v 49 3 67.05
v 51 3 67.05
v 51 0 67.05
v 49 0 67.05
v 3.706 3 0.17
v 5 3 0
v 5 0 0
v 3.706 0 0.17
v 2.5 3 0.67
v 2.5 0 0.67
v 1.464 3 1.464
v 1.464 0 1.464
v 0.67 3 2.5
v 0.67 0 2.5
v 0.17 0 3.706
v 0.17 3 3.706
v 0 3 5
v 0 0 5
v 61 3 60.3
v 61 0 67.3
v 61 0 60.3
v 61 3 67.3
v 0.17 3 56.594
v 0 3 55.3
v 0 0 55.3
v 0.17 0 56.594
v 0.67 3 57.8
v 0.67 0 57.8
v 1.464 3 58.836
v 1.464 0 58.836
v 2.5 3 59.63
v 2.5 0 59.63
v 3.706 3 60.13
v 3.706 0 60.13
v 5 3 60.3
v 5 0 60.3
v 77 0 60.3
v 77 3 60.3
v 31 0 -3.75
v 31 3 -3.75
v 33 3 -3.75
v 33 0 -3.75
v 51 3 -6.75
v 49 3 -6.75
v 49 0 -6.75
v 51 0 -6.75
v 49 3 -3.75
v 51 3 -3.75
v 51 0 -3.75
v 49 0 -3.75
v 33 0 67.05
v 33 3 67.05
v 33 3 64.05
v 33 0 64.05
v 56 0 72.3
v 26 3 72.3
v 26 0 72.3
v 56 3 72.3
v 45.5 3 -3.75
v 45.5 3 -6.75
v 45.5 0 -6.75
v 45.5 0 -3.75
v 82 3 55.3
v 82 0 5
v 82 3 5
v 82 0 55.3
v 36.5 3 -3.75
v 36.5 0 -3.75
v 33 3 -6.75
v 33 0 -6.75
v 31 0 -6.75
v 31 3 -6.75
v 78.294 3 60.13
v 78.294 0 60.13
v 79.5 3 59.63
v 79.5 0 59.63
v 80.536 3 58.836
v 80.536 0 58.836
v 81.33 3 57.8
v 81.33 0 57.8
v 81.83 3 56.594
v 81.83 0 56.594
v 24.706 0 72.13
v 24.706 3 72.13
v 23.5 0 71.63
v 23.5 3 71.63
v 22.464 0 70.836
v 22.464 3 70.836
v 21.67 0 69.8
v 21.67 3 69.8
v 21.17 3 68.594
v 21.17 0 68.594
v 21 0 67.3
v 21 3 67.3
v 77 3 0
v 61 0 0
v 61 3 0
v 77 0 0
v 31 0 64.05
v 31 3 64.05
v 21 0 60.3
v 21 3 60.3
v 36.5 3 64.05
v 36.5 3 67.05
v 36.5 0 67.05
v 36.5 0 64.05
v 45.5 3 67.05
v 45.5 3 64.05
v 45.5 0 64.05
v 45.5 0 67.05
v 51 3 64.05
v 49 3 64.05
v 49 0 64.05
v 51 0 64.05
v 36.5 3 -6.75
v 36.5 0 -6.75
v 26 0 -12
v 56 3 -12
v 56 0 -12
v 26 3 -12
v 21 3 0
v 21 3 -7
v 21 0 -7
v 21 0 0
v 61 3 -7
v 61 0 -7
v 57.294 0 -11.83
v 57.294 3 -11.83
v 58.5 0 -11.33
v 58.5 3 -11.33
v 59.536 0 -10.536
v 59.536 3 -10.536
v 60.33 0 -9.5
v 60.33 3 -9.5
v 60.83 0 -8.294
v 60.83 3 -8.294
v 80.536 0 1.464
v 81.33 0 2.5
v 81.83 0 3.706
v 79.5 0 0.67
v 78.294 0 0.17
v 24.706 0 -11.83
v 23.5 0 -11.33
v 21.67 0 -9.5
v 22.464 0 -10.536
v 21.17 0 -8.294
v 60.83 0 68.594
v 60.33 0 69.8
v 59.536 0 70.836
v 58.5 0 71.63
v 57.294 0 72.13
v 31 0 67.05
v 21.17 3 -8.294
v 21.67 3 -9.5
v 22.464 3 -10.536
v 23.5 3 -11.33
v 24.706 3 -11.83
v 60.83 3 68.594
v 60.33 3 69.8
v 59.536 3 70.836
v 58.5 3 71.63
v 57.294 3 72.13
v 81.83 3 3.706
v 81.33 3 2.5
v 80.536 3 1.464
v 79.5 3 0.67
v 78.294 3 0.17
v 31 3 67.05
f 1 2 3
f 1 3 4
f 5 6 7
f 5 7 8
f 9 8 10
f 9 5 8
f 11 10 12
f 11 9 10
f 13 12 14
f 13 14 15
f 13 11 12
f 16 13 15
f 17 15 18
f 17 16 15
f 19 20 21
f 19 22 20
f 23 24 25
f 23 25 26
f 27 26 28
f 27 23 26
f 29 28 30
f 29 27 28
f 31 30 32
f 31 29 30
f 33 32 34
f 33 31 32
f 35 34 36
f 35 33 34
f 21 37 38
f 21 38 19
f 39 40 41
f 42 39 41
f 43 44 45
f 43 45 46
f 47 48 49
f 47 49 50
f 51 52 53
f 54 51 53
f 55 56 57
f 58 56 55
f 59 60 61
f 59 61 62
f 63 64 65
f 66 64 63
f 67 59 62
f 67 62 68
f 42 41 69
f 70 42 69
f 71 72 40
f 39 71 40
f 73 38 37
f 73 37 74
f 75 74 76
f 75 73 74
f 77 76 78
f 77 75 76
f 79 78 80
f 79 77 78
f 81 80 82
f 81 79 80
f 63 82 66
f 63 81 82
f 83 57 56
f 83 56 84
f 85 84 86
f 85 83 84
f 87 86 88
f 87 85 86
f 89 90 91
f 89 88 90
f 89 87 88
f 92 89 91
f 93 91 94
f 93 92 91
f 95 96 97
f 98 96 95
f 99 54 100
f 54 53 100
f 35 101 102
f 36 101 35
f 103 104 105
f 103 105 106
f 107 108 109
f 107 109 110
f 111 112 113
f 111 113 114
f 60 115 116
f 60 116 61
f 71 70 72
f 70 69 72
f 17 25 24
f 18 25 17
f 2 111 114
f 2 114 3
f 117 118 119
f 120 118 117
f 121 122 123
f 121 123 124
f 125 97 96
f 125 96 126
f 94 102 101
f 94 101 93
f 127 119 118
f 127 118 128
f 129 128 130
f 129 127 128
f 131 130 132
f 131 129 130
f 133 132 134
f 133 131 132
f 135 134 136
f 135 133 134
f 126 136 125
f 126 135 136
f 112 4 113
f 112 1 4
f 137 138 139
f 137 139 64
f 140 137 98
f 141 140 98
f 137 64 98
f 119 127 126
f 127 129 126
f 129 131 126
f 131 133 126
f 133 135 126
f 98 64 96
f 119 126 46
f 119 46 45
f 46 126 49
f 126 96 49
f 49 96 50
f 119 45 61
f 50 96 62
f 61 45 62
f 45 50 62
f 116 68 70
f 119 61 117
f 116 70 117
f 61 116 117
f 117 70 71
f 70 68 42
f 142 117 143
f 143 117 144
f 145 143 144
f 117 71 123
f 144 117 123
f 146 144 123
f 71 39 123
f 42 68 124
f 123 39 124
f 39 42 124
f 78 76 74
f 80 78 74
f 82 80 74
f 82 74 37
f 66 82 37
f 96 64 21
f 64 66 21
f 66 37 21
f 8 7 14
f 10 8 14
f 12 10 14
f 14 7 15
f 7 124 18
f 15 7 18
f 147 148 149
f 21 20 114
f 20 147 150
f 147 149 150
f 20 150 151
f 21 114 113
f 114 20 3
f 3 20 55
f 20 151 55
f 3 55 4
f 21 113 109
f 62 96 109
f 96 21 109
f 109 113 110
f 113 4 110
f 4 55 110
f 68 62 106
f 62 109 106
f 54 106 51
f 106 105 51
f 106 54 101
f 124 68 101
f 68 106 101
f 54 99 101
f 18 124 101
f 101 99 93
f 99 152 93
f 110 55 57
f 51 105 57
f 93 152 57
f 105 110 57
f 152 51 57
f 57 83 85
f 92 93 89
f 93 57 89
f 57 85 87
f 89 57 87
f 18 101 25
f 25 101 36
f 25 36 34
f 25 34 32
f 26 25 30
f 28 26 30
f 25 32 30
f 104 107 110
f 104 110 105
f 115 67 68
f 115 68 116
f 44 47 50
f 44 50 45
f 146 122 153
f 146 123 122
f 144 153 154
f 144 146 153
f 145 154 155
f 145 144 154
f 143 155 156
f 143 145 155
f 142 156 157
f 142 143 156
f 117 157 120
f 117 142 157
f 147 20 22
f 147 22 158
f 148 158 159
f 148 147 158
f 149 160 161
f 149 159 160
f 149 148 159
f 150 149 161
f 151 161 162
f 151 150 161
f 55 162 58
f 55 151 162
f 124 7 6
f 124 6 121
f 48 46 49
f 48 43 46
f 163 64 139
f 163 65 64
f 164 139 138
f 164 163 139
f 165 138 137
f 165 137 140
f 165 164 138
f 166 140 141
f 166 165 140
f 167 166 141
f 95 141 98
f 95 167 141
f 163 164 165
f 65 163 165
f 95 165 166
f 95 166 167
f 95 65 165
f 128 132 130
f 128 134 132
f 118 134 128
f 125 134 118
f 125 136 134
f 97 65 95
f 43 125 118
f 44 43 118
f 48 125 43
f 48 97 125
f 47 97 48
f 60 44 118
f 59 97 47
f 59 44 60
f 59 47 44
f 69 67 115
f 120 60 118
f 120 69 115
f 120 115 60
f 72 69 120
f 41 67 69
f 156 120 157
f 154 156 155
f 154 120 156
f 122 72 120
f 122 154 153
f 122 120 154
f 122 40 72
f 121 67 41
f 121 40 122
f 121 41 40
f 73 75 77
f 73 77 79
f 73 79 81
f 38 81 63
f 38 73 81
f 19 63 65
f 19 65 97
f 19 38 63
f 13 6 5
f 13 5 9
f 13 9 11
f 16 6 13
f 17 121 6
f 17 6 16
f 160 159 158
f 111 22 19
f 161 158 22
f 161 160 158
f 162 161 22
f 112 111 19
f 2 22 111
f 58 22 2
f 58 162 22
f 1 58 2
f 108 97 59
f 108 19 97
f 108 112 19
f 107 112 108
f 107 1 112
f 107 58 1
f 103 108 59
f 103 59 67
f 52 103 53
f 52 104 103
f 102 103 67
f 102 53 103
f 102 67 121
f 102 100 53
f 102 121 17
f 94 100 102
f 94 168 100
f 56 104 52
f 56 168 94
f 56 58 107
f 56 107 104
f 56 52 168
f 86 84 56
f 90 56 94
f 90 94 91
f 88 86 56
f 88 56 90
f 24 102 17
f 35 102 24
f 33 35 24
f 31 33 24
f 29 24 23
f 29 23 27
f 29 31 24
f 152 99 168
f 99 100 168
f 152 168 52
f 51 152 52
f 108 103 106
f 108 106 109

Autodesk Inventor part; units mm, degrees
ref_plane "YZ Plane" through (0, 0, 0) normal (1, 0, 0) x (0, 1, 0)
ref_plane "XZ Plane" through (0, 0, 0) normal (0, 1, 0) x (-1, 0, 0)
sketch "Sketch1" plane through (0, 0, 0) normal (0, 1, 0) x (-1, 0, 0)
  line L0 (0, 0) -> (-82, 0)
  line L1 (-82, 0) -> (-82, 60.3)
  line L2 (-82, 60.3) -> (0, 60.3)
  line L3 (0, 60.3) -> (0, 0)
  dimension "d0" = 82
  dimension "d1" = 60.3
extrude "Extrusion1" add sketch "Sketch1" along normal blind 3
sketch "Sketch3" plane through (0, 3, 0) normal (0, 1, 0) x (1, 0, 0)
  line L0 (82, -60.3) -> (82, 0) projected
  line L1 (82, 0) -> (0, 0) projected
  line L2 (21, 0) -> (61, 0)
  line L3 (61, 0) -> (61, 12)
  line L4 (61, 12) -> (21, 12)
  line L5 (21, 12) -> (21, 0)
  dimension "d22" = 82
  dimension "d23" = 12
  dimension "d24" = 21
  dimension "d25" = 40
extrude "Extrusion3" add sketch "Sketch3" against normal blind 3
sketch "Sketch4" plane through (0, 3, 0) normal (0, 1, 0) x (1, 0, 0)
  line L0 (82, 0) -> (61, 0) projected
  line L1 (61, 0) -> (61, 12) projected
  line L2 (36.5, 6.75) -> (45.5, 6.75)
  line L3 (45.5, 6.75) -> (45.5, 3.75)
  line L4 (45.5, 3.75) -> (36.5, 3.75)
  line L5 (36.5, 3.75) -> (36.5, 6.75)
  line L6 (38, 6.75) -> (43, 6.75)
  line L7 (49, 6.75) -> (51, 6.75)
  line L8 (51, 6.75) -> (51, 3.75)
  line L9 (51, 3.75) -> (49, 3.75)
  line L10 (49, 3.75) -> (49, 6.75)
  line L11 (41, 6.75) -> (41, 3.75) construction
  line L12 (33, 6.75) -> (31, 6.75)
  line L13 (31, 6.75) -> (31, 3.75)
  line L14 (31, 3.75) -> (33, 3.75)
  line L15 (33, 3.75) -> (33, 6.75)
  point P0 (21, 12)
  dimension "d28" = 9
  dimension "d29" = 3
  dimension "d30" = 3.75
  dimension "d31" = 40
  dimension "d32" = 15.5
  dimension "d42" = 2
  dimension "d43" = 3
  dimension "d44" = 3.5
extrude "Extrusion4" cut sketch "Sketch4" against normal blind 3
fillet "Fillet1" radius 5 6 edges at (0, 1.5, 60.3) (82, 1.5, 60.3) (82, 1.5, 0) (61, 1.5, -12) (21, 1.5, -12) (0, 1.5, 0)
ref_plane "Work Plane1" through (5, 0, 30.15) normal (0, 0, 1) x (1, 0, 0)
mirror "Mirror1" about plane through (5, 0, 30.15) normal (0, 0, 1) of "Extrusion3", "Extrusion4"
mirror "Mirror2" about plane through (5, 0, 30.15) normal (0, 0, 1) of "Fillet1"
equation "\"d24\" = -0.5 * d25 + 0.5 * d22"
equation "\"d32\" = -0.5 * d28 + 0.5 * d31"
properties part number "base protopress" material "Glass"
